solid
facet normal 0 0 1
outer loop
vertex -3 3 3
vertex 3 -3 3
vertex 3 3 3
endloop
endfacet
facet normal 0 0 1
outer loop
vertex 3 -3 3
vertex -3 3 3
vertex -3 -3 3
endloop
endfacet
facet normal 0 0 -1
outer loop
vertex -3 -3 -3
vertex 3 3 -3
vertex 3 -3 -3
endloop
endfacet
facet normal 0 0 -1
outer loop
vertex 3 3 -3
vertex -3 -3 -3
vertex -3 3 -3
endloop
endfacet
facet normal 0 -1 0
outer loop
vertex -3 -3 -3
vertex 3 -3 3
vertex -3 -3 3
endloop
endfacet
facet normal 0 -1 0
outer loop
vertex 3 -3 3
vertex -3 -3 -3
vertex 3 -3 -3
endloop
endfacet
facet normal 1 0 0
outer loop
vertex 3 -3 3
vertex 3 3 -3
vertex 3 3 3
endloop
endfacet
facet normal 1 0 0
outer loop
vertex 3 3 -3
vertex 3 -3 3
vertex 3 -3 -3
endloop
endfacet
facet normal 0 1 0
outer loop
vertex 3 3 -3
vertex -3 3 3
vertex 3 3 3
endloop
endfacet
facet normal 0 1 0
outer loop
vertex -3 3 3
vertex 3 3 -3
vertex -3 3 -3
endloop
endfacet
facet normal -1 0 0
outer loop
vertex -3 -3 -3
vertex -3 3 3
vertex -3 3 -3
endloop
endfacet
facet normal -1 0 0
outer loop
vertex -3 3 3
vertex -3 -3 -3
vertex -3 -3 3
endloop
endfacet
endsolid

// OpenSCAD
// Generated by Mecha (https://github.com/tomahawkins/mecha)

color([0.5, 0.5, 0.5, 1.0]) translate ([-3.0, -3.0, -3.0]) cube(size = [6.0, 6.0, 6.0], center = false);
